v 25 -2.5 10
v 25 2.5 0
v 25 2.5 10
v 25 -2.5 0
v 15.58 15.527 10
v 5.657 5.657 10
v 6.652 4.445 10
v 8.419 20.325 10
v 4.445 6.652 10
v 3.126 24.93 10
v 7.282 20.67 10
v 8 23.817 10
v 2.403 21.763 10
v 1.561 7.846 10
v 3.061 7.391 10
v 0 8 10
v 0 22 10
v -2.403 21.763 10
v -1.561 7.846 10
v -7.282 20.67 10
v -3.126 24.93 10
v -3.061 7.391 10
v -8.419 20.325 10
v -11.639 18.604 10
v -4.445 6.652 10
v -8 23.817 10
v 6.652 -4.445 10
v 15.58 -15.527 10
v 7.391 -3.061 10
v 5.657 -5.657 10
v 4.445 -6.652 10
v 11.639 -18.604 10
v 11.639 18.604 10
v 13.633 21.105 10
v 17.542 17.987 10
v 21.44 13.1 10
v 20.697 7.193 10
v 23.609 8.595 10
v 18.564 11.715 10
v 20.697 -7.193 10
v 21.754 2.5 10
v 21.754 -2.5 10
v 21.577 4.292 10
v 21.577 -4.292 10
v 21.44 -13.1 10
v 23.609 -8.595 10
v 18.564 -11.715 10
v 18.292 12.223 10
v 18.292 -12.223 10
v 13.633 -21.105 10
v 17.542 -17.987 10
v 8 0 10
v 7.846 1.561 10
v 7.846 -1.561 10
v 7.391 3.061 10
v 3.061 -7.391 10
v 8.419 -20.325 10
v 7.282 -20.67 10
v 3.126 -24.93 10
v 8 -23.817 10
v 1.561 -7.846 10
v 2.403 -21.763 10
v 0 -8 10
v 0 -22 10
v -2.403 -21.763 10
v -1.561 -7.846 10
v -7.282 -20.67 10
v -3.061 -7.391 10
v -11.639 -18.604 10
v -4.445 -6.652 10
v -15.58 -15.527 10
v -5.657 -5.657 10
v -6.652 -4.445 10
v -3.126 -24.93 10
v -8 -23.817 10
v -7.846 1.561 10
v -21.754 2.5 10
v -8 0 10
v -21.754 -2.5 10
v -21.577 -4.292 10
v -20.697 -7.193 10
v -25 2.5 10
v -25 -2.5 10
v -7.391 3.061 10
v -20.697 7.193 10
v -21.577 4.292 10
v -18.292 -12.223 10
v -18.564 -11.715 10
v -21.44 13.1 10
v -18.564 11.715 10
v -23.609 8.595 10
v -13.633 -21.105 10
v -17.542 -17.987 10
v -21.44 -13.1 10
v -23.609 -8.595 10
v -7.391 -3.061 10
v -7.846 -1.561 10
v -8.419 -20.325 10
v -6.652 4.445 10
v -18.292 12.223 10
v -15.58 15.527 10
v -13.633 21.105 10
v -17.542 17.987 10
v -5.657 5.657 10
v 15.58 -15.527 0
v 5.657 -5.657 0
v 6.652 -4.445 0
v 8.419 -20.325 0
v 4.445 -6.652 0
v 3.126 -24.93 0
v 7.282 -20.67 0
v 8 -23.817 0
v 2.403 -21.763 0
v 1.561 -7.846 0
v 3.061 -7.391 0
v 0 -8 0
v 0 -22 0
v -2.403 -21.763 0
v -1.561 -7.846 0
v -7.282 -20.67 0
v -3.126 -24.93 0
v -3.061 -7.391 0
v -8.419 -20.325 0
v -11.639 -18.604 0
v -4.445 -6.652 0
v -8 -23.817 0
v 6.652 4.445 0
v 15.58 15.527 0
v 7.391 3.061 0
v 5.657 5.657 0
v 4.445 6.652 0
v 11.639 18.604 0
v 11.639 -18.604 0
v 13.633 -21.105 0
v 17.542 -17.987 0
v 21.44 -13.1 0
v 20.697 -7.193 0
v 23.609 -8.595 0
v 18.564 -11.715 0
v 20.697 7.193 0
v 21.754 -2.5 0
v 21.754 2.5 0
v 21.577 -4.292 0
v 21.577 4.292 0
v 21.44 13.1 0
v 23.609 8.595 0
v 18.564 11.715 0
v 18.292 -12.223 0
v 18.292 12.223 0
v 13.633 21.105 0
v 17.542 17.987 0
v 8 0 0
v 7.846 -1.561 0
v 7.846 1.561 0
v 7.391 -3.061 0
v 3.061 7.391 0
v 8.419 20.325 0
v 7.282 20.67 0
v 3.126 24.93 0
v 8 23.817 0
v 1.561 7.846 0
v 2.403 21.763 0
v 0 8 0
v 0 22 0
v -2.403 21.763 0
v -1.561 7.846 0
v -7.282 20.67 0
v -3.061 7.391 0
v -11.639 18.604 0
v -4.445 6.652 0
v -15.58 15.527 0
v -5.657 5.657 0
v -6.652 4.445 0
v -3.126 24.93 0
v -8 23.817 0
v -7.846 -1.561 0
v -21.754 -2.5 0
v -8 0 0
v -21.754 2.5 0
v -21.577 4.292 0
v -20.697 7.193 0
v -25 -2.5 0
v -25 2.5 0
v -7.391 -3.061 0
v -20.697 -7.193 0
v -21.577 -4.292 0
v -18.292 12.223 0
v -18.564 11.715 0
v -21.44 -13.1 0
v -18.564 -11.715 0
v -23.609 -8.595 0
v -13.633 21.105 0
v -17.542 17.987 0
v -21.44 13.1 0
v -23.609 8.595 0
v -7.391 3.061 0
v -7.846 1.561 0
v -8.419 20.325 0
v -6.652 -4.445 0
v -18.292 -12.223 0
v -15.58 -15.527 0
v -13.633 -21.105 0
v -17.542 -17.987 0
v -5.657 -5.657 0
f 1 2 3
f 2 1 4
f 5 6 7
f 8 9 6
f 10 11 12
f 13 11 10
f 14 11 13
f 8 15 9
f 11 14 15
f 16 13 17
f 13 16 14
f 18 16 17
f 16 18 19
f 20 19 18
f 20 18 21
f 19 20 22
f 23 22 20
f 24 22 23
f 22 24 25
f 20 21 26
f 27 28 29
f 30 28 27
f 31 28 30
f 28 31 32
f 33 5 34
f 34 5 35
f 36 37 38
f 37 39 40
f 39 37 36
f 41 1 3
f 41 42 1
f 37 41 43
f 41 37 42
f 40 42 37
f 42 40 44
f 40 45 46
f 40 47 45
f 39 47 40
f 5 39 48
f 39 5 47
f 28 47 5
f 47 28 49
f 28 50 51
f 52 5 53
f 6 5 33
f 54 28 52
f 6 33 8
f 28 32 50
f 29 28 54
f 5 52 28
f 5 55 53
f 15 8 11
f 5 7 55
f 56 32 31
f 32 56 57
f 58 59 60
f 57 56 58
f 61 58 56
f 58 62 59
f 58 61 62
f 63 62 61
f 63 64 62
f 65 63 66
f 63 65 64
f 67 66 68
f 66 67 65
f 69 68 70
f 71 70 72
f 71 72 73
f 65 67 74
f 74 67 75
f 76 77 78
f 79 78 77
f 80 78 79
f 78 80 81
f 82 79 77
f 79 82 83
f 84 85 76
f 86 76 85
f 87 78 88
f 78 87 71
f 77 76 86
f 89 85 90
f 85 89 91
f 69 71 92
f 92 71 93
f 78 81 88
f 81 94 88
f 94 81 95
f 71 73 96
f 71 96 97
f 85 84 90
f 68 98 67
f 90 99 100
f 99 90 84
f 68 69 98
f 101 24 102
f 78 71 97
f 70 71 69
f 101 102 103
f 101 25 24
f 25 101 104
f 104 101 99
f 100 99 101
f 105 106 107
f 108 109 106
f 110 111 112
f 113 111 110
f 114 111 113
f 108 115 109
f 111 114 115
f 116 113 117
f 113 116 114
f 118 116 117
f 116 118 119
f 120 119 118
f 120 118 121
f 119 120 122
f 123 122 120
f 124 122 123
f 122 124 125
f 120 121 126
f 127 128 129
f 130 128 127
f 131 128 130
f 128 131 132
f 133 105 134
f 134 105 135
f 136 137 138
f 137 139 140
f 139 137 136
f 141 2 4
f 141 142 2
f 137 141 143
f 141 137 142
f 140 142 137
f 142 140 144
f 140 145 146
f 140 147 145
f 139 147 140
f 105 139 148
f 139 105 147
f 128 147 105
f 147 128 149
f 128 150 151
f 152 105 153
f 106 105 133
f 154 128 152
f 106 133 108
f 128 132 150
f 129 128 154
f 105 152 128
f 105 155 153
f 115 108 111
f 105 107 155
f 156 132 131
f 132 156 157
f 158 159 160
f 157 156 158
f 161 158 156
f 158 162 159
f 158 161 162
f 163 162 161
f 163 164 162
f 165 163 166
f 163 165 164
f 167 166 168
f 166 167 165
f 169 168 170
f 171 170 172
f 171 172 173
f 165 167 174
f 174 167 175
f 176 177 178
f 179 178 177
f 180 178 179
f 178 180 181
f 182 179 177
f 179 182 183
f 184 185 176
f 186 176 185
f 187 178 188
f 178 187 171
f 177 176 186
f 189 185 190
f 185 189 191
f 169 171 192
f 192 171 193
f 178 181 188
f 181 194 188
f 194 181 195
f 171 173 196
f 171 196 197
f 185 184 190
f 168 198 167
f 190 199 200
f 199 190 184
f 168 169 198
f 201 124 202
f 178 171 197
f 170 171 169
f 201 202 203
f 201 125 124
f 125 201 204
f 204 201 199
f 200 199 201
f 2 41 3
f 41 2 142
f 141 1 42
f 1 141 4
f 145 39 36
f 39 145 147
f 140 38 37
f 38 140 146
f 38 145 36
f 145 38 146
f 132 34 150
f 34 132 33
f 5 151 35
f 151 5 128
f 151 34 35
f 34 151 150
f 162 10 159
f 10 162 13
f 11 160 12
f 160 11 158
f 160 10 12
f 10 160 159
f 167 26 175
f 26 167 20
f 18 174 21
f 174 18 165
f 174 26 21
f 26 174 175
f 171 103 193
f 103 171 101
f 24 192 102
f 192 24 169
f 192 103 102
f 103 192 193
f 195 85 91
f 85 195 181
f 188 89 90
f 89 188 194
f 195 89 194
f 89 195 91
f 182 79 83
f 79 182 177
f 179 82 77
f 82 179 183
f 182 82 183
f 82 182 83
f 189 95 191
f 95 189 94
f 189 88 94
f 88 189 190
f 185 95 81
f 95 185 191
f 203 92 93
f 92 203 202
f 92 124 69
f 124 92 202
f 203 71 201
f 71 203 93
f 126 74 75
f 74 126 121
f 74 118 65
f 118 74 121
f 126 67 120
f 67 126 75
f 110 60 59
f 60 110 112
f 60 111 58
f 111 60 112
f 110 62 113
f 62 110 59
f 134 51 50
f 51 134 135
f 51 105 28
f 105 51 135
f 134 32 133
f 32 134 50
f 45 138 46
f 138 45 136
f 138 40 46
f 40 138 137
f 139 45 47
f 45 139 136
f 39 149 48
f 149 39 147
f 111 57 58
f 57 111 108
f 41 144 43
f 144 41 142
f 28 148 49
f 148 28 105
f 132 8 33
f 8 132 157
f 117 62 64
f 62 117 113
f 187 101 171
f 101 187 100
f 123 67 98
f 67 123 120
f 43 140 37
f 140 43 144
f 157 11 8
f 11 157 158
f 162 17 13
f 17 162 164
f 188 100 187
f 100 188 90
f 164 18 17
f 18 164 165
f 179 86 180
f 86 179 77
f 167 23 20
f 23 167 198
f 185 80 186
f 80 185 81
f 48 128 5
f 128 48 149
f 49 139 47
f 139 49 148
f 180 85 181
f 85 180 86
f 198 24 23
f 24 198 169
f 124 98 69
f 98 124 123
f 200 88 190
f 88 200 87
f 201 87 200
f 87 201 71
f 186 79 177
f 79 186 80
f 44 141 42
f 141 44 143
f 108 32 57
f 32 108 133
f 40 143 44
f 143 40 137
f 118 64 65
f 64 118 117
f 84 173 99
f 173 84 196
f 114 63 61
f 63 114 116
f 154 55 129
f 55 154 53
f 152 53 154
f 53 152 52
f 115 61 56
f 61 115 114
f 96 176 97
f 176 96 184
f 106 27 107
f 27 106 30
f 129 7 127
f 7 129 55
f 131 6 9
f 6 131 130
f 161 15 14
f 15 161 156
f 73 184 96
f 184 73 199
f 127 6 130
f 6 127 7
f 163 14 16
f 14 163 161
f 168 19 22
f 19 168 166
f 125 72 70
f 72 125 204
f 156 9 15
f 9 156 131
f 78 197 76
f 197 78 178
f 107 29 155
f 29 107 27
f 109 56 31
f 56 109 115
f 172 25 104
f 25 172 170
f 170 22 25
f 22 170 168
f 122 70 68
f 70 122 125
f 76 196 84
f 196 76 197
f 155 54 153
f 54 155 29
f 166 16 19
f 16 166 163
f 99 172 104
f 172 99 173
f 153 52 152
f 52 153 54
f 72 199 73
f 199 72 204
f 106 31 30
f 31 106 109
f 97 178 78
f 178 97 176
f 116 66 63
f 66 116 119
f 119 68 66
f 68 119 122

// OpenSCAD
$fn = 32;

// ----------------------------------------------------------------------
// Spur blank: bored gear blank
// ----------------------------------------------------------------------

// --- parameters (mm) ---
disc_r = 22;              // blank root radius
disc_t = 10;              // blank thickness
n_teeth = 14;             // stub tooth count
tooth_w = 5;              // tooth width at the root
tooth_h = 3;              // tooth height above the root
bore_r = 8;               // central bore radius

out_r = disc_r + tooth_h;  // tip radius
bbox_x = 50.0;  // measured width over the teeth
bbox_y = 49.86;  // measured depth over the teeth

difference() {
union() {
  cylinder(r = disc_r, h = disc_t);
  for (i = [0 : n_teeth - 1])
    rotate([0, 0, i * 360 / n_teeth])
      translate([disc_r - 1, -tooth_w / 2, 0])
        cube([tooth_h + 1, tooth_w, disc_t]);
}
  translate([0, 0, -1]) cylinder(r = bore_r, h = disc_t + 2);
}
